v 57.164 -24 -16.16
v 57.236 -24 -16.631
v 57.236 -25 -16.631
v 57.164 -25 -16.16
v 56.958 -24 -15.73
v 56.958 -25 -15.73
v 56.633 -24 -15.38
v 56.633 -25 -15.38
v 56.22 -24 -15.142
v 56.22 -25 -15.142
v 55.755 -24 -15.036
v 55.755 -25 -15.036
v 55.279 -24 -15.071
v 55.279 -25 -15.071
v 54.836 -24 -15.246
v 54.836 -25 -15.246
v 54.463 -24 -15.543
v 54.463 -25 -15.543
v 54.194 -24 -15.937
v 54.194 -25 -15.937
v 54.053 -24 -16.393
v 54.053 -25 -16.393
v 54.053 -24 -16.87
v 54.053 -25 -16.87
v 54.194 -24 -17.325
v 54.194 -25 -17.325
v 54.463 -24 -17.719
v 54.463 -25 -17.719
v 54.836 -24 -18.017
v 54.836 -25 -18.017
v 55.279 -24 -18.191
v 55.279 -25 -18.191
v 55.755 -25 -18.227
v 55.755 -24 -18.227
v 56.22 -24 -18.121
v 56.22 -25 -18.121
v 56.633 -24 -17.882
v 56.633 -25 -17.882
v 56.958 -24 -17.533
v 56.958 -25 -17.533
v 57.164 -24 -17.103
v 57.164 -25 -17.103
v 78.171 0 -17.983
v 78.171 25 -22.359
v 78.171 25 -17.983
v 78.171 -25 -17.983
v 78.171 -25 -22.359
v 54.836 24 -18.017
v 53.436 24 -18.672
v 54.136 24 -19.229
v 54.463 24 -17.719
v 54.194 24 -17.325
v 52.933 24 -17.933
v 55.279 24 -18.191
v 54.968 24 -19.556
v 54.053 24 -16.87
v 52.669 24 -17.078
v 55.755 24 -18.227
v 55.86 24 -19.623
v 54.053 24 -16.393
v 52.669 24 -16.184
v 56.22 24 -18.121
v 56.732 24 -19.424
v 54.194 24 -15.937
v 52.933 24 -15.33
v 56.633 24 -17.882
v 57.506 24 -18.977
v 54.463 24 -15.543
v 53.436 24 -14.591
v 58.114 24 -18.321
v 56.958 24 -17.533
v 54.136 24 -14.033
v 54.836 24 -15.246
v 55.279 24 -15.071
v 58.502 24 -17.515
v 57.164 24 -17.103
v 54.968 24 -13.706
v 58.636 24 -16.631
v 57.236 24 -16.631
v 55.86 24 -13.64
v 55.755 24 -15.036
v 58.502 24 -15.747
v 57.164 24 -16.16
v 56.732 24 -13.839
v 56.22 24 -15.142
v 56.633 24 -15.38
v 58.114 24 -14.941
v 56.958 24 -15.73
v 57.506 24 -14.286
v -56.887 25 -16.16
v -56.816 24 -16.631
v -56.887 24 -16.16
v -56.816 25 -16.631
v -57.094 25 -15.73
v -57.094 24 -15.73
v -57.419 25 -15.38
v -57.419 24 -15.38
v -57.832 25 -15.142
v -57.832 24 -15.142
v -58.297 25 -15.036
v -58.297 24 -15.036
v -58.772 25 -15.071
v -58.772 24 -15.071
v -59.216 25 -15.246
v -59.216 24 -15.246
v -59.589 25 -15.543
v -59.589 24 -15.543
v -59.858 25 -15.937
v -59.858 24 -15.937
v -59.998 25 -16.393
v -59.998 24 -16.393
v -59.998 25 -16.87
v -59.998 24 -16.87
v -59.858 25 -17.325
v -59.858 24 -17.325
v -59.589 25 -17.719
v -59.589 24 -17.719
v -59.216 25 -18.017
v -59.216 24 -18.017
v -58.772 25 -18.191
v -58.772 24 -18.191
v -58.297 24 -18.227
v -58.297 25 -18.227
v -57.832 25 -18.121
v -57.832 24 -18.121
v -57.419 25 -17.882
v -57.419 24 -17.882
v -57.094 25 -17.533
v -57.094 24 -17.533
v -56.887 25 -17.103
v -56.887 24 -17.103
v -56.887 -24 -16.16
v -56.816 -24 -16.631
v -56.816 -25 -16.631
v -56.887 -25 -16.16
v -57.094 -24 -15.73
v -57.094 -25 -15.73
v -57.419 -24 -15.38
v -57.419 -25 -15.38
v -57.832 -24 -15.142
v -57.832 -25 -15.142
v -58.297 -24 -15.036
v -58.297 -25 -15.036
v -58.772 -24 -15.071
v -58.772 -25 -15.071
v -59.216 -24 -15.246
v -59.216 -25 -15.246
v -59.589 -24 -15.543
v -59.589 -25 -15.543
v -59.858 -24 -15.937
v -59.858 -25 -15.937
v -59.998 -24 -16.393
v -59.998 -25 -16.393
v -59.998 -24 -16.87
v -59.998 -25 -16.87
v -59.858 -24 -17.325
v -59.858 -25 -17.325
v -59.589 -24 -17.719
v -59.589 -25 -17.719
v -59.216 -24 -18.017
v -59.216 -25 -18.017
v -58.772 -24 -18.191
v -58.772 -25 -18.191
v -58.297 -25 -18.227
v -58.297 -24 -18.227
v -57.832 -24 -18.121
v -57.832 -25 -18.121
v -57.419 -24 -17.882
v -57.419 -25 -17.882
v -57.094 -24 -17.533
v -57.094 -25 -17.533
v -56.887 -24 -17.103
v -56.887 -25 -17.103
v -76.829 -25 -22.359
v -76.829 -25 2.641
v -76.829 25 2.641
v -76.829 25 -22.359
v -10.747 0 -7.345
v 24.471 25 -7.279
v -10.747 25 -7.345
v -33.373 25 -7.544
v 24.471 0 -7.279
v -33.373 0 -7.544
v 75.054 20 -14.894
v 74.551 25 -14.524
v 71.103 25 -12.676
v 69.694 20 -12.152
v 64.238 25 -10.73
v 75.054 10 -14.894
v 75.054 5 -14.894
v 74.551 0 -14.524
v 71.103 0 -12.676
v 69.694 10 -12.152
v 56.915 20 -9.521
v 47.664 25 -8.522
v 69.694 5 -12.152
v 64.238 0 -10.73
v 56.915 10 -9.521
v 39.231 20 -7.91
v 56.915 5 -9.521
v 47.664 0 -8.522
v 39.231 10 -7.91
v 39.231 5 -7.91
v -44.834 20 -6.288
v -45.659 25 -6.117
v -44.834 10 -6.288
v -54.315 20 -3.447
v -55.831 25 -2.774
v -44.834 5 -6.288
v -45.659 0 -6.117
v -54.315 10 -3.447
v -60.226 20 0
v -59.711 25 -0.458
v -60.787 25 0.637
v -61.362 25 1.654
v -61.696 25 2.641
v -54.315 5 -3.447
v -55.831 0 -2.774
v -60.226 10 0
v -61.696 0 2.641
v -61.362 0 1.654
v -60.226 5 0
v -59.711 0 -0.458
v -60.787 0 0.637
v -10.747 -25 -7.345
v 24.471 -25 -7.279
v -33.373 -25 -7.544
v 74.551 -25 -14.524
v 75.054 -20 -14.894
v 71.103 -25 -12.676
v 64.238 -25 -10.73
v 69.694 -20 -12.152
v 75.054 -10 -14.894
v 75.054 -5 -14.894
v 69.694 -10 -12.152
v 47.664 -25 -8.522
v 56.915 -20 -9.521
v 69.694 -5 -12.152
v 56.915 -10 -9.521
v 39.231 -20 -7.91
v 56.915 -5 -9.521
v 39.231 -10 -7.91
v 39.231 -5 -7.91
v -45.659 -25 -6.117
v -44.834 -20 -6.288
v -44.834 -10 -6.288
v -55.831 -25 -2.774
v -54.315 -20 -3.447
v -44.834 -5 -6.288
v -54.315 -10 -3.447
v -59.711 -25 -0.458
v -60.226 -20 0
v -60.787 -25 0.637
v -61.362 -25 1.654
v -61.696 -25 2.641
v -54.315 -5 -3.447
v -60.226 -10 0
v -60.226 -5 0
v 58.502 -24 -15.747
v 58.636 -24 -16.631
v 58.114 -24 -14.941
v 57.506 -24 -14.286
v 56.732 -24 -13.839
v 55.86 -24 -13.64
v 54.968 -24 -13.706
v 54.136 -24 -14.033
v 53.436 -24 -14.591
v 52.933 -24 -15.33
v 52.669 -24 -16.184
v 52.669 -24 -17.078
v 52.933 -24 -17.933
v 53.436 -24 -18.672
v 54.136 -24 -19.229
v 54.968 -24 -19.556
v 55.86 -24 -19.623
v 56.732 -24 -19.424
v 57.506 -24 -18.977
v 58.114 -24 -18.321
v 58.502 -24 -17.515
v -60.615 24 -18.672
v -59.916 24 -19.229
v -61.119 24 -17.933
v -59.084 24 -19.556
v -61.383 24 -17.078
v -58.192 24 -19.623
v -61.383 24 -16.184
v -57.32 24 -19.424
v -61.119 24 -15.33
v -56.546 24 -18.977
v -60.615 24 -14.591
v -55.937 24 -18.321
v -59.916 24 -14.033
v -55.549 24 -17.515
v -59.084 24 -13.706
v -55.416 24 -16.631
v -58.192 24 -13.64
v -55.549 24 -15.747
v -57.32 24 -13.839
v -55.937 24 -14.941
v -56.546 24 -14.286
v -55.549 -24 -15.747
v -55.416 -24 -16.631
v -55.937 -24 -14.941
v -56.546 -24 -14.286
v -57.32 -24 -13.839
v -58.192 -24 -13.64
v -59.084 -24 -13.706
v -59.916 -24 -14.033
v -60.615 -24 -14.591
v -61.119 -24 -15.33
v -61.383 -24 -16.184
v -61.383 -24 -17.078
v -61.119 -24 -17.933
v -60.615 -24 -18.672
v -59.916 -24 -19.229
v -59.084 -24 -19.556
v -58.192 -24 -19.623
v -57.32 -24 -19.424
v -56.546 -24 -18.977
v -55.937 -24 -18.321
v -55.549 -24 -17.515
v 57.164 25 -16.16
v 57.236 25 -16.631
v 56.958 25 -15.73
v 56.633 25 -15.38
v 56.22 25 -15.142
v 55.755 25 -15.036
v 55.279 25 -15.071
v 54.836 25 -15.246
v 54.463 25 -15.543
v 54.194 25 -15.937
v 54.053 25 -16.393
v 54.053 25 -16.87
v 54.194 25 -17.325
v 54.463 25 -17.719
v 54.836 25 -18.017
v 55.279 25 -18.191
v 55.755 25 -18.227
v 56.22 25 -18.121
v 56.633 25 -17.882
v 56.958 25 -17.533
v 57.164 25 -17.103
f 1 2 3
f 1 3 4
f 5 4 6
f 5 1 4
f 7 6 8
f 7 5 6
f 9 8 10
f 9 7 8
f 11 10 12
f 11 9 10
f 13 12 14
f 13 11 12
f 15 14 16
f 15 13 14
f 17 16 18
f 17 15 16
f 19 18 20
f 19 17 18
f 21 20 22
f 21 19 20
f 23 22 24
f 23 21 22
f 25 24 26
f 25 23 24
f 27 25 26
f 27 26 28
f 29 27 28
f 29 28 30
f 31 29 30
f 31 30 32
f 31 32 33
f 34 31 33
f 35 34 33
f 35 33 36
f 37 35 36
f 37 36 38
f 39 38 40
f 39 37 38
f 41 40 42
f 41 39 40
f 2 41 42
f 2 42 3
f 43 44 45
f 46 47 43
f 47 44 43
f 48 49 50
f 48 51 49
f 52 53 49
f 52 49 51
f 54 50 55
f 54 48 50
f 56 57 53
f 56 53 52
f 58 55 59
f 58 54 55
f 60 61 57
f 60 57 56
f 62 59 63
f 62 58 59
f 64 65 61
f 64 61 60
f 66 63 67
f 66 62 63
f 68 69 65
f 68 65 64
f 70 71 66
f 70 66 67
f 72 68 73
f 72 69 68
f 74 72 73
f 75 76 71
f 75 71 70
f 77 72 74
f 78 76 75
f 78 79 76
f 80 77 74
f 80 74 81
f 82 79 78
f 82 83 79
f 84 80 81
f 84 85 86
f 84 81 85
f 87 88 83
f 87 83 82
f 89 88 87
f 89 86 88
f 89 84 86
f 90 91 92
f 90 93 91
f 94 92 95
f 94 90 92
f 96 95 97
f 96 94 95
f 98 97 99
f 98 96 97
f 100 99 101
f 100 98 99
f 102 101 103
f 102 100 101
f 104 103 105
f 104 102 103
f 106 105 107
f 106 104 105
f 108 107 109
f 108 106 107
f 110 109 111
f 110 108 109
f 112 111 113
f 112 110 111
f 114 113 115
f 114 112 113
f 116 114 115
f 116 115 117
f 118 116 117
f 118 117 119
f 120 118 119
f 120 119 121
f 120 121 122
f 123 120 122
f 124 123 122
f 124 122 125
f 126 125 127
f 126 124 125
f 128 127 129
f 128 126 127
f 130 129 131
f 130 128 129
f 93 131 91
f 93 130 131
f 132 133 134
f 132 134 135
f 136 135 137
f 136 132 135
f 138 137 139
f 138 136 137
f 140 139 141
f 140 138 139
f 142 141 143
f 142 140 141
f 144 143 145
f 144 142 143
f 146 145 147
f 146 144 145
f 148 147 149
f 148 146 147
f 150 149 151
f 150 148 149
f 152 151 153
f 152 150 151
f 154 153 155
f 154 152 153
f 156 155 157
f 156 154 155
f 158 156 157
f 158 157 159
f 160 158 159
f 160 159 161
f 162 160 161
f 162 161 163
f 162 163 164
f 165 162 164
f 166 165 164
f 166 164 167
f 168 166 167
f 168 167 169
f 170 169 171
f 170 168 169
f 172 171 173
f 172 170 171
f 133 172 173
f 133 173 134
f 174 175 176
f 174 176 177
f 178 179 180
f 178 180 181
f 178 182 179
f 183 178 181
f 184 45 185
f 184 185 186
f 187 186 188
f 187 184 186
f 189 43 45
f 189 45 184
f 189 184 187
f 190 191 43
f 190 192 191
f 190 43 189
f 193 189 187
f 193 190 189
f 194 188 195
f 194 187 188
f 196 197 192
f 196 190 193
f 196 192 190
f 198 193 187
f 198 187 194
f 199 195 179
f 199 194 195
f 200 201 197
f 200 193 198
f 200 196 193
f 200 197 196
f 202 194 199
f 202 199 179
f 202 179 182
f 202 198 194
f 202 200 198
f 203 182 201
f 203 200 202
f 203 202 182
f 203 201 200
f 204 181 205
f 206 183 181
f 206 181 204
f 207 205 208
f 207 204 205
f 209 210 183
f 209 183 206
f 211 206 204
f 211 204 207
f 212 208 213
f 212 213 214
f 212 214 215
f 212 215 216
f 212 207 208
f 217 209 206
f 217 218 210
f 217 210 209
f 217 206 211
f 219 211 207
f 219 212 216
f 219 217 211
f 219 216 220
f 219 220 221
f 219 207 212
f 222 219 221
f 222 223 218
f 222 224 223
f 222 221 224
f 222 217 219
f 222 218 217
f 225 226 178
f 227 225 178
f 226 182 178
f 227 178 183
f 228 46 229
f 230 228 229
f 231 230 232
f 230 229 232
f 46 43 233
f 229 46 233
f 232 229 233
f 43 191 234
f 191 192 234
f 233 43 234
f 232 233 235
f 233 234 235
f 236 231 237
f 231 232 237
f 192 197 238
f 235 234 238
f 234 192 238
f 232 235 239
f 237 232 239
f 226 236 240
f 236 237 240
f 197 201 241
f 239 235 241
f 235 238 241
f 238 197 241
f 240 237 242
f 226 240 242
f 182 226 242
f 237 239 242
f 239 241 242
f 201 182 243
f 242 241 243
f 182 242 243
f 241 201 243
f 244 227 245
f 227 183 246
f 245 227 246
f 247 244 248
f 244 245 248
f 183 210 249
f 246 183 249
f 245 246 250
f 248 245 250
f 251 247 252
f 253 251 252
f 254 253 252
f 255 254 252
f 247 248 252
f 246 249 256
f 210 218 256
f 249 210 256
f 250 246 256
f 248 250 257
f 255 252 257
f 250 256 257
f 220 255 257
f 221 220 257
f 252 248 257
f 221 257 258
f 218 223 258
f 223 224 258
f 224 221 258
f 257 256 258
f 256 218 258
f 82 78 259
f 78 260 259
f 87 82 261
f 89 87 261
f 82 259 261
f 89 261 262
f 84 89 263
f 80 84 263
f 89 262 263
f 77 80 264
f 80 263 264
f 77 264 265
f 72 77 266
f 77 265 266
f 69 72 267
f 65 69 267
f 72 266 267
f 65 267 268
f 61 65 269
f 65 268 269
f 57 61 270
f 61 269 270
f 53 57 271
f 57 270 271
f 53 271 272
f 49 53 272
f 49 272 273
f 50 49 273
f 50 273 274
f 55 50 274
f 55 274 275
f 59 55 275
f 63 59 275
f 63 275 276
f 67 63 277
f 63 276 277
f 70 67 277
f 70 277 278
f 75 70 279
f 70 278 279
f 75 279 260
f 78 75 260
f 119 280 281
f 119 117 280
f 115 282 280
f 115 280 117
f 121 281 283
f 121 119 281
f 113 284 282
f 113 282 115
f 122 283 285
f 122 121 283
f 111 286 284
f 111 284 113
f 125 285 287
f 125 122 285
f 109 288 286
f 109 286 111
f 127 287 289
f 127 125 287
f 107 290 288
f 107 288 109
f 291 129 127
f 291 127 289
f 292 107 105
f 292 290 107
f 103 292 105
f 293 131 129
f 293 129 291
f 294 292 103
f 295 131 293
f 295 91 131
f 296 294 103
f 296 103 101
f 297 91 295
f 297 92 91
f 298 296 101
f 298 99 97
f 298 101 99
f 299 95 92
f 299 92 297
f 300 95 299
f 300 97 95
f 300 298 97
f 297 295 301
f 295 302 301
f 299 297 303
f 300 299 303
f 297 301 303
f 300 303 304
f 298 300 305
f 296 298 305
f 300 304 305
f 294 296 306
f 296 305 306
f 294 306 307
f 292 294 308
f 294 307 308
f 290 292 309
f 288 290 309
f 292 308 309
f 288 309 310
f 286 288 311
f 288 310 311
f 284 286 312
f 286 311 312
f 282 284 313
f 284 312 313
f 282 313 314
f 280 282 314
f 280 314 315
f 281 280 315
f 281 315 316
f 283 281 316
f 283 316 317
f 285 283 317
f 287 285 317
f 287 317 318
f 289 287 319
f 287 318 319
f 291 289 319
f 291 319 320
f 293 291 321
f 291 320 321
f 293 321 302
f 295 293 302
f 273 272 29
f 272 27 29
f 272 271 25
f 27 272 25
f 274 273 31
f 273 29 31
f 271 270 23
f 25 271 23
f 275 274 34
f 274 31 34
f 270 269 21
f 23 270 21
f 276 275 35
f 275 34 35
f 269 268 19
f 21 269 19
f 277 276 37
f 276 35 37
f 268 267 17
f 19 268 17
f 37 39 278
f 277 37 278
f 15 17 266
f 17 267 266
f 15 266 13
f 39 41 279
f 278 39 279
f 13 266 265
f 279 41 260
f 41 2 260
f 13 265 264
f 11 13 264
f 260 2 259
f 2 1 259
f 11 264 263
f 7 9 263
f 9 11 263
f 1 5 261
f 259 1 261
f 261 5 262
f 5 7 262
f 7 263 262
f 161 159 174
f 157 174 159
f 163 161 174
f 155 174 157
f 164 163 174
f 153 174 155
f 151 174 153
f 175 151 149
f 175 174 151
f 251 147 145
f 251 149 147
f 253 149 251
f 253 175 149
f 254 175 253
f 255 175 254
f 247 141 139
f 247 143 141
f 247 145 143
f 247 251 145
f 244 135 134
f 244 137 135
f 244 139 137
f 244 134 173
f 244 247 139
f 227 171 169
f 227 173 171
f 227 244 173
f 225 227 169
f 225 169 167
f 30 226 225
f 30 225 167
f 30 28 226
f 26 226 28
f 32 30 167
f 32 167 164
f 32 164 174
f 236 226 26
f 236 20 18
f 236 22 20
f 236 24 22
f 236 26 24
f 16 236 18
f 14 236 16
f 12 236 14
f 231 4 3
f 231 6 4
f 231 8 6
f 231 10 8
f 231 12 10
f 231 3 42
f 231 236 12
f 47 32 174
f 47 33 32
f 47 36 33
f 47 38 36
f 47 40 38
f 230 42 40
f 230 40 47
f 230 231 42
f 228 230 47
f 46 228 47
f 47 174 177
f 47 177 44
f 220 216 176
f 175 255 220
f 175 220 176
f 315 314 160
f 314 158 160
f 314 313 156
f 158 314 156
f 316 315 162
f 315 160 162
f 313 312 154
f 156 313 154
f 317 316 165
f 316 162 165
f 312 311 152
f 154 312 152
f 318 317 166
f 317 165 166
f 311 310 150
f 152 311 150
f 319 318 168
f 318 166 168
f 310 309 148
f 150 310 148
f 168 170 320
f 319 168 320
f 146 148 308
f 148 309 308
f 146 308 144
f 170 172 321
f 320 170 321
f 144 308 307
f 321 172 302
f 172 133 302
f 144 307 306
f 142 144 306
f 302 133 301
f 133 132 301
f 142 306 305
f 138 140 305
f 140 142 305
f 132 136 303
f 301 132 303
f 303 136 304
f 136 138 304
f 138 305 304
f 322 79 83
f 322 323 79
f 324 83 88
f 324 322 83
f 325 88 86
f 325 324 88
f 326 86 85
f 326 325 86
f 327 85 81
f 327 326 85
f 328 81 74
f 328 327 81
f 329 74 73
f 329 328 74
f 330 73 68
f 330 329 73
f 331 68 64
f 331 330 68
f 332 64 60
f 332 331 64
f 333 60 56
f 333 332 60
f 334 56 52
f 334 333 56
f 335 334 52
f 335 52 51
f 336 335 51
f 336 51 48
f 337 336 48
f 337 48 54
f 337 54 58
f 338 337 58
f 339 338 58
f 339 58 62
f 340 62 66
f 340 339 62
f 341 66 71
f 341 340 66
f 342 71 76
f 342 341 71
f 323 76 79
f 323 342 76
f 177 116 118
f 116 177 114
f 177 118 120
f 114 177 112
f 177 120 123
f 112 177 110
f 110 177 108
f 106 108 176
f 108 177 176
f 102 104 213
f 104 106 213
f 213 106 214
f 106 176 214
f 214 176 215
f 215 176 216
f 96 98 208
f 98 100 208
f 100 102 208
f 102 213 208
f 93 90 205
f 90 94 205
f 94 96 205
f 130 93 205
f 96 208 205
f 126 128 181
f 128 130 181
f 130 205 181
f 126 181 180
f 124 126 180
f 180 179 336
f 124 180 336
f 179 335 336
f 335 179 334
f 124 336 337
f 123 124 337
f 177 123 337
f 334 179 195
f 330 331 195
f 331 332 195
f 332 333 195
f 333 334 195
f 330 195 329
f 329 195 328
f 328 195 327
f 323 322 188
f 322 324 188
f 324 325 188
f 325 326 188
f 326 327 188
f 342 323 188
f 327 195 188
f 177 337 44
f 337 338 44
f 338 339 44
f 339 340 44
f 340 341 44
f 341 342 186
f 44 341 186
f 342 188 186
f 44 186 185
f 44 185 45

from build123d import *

# Parameters (mm, degrees)
F0_R     = 3
F0_R_2   = 1.6
F1_DEPTH = 25
F2_DEPTH = 24
F3_DEPTH = 24


with BuildPart() as f1:
    # F0 (on Front) → F1 (new body, symmetric)
    with BuildSketch(Plane.XZ):
        with BuildLine():
            Line((-61.6962313652, 2.6412474989), (-76.8291646242, 2.6412474989))
            Line((-76.8291646242, 2.6412474989), (-76.8291646242, -22.3587525011))
            Line((-76.8291646242, -22.3587525011), (78.1708353758, -22.3587525011))
            Line((78.1708353758, -22.3587525011), (78.1708353758, -17.983244732))
            add(Edge.make_bspline(
                [(78.1708353758, -17.983244732), (76.3424520151, -15.8849559066), (69.7492732133, -8.3184938059), (-2.0870551517, -5.889635406), (-41.778677222, -9.3077890022), (-60.5878884114, -1.0564529523), (-61.4411643979, 1.790282338), (-61.6962313652, 2.6412474989)],
                knots=[0, 0, 0, 0, 0.1332108471, 0.4803603839, 0.7584547793, 0.9277956864, 1, 1, 1, 1], degree=3))
        make_face()
        with Locations((-58.4162026644, -16.6311897337)):
            Circle(F0_R, mode=Mode.SUBTRACT)
        with Locations((55.635523051, -16.6311897337)):
            Circle(F0_R, mode=Mode.SUBTRACT)
        with Locations((-58.4162026644, -16.6311897337)):
            Circle(F0_R)
        with Locations((-58.4162026644, -16.6311897337)):
            Circle(F0_R_2, mode=Mode.SUBTRACT)
        with Locations((55.635523051, -16.6311897337)):
            Circle(F0_R)
        with Locations((55.635523051, -16.6311897337)):
            Circle(F0_R_2, mode=Mode.SUBTRACT)
    extrude(amount=F1_DEPTH, both=True)

    # F0 (on Front) → F2 (cut, symmetric)
    with BuildSketch(Plane.XZ):
        with Locations((-58.4162026644, -16.6311897337)):
            Circle(F0_R)
        with Locations((-58.4162026644, -16.6311897337)):
            Circle(F0_R_2, mode=Mode.SUBTRACT)
    extrude(amount=F2_DEPTH, both=True, mode=Mode.SUBTRACT)

    # F0 (on Front) → F3 (cut, symmetric)
    with BuildSketch(Plane.XZ):
        with Locations((55.635523051, -16.6311897337)):
            Circle(F0_R)
        with Locations((55.635523051, -16.6311897337)):
            Circle(F0_R_2, mode=Mode.SUBTRACT)
    extrude(amount=F3_DEPTH, both=True, mode=Mode.SUBTRACT)


solid = f1.part
